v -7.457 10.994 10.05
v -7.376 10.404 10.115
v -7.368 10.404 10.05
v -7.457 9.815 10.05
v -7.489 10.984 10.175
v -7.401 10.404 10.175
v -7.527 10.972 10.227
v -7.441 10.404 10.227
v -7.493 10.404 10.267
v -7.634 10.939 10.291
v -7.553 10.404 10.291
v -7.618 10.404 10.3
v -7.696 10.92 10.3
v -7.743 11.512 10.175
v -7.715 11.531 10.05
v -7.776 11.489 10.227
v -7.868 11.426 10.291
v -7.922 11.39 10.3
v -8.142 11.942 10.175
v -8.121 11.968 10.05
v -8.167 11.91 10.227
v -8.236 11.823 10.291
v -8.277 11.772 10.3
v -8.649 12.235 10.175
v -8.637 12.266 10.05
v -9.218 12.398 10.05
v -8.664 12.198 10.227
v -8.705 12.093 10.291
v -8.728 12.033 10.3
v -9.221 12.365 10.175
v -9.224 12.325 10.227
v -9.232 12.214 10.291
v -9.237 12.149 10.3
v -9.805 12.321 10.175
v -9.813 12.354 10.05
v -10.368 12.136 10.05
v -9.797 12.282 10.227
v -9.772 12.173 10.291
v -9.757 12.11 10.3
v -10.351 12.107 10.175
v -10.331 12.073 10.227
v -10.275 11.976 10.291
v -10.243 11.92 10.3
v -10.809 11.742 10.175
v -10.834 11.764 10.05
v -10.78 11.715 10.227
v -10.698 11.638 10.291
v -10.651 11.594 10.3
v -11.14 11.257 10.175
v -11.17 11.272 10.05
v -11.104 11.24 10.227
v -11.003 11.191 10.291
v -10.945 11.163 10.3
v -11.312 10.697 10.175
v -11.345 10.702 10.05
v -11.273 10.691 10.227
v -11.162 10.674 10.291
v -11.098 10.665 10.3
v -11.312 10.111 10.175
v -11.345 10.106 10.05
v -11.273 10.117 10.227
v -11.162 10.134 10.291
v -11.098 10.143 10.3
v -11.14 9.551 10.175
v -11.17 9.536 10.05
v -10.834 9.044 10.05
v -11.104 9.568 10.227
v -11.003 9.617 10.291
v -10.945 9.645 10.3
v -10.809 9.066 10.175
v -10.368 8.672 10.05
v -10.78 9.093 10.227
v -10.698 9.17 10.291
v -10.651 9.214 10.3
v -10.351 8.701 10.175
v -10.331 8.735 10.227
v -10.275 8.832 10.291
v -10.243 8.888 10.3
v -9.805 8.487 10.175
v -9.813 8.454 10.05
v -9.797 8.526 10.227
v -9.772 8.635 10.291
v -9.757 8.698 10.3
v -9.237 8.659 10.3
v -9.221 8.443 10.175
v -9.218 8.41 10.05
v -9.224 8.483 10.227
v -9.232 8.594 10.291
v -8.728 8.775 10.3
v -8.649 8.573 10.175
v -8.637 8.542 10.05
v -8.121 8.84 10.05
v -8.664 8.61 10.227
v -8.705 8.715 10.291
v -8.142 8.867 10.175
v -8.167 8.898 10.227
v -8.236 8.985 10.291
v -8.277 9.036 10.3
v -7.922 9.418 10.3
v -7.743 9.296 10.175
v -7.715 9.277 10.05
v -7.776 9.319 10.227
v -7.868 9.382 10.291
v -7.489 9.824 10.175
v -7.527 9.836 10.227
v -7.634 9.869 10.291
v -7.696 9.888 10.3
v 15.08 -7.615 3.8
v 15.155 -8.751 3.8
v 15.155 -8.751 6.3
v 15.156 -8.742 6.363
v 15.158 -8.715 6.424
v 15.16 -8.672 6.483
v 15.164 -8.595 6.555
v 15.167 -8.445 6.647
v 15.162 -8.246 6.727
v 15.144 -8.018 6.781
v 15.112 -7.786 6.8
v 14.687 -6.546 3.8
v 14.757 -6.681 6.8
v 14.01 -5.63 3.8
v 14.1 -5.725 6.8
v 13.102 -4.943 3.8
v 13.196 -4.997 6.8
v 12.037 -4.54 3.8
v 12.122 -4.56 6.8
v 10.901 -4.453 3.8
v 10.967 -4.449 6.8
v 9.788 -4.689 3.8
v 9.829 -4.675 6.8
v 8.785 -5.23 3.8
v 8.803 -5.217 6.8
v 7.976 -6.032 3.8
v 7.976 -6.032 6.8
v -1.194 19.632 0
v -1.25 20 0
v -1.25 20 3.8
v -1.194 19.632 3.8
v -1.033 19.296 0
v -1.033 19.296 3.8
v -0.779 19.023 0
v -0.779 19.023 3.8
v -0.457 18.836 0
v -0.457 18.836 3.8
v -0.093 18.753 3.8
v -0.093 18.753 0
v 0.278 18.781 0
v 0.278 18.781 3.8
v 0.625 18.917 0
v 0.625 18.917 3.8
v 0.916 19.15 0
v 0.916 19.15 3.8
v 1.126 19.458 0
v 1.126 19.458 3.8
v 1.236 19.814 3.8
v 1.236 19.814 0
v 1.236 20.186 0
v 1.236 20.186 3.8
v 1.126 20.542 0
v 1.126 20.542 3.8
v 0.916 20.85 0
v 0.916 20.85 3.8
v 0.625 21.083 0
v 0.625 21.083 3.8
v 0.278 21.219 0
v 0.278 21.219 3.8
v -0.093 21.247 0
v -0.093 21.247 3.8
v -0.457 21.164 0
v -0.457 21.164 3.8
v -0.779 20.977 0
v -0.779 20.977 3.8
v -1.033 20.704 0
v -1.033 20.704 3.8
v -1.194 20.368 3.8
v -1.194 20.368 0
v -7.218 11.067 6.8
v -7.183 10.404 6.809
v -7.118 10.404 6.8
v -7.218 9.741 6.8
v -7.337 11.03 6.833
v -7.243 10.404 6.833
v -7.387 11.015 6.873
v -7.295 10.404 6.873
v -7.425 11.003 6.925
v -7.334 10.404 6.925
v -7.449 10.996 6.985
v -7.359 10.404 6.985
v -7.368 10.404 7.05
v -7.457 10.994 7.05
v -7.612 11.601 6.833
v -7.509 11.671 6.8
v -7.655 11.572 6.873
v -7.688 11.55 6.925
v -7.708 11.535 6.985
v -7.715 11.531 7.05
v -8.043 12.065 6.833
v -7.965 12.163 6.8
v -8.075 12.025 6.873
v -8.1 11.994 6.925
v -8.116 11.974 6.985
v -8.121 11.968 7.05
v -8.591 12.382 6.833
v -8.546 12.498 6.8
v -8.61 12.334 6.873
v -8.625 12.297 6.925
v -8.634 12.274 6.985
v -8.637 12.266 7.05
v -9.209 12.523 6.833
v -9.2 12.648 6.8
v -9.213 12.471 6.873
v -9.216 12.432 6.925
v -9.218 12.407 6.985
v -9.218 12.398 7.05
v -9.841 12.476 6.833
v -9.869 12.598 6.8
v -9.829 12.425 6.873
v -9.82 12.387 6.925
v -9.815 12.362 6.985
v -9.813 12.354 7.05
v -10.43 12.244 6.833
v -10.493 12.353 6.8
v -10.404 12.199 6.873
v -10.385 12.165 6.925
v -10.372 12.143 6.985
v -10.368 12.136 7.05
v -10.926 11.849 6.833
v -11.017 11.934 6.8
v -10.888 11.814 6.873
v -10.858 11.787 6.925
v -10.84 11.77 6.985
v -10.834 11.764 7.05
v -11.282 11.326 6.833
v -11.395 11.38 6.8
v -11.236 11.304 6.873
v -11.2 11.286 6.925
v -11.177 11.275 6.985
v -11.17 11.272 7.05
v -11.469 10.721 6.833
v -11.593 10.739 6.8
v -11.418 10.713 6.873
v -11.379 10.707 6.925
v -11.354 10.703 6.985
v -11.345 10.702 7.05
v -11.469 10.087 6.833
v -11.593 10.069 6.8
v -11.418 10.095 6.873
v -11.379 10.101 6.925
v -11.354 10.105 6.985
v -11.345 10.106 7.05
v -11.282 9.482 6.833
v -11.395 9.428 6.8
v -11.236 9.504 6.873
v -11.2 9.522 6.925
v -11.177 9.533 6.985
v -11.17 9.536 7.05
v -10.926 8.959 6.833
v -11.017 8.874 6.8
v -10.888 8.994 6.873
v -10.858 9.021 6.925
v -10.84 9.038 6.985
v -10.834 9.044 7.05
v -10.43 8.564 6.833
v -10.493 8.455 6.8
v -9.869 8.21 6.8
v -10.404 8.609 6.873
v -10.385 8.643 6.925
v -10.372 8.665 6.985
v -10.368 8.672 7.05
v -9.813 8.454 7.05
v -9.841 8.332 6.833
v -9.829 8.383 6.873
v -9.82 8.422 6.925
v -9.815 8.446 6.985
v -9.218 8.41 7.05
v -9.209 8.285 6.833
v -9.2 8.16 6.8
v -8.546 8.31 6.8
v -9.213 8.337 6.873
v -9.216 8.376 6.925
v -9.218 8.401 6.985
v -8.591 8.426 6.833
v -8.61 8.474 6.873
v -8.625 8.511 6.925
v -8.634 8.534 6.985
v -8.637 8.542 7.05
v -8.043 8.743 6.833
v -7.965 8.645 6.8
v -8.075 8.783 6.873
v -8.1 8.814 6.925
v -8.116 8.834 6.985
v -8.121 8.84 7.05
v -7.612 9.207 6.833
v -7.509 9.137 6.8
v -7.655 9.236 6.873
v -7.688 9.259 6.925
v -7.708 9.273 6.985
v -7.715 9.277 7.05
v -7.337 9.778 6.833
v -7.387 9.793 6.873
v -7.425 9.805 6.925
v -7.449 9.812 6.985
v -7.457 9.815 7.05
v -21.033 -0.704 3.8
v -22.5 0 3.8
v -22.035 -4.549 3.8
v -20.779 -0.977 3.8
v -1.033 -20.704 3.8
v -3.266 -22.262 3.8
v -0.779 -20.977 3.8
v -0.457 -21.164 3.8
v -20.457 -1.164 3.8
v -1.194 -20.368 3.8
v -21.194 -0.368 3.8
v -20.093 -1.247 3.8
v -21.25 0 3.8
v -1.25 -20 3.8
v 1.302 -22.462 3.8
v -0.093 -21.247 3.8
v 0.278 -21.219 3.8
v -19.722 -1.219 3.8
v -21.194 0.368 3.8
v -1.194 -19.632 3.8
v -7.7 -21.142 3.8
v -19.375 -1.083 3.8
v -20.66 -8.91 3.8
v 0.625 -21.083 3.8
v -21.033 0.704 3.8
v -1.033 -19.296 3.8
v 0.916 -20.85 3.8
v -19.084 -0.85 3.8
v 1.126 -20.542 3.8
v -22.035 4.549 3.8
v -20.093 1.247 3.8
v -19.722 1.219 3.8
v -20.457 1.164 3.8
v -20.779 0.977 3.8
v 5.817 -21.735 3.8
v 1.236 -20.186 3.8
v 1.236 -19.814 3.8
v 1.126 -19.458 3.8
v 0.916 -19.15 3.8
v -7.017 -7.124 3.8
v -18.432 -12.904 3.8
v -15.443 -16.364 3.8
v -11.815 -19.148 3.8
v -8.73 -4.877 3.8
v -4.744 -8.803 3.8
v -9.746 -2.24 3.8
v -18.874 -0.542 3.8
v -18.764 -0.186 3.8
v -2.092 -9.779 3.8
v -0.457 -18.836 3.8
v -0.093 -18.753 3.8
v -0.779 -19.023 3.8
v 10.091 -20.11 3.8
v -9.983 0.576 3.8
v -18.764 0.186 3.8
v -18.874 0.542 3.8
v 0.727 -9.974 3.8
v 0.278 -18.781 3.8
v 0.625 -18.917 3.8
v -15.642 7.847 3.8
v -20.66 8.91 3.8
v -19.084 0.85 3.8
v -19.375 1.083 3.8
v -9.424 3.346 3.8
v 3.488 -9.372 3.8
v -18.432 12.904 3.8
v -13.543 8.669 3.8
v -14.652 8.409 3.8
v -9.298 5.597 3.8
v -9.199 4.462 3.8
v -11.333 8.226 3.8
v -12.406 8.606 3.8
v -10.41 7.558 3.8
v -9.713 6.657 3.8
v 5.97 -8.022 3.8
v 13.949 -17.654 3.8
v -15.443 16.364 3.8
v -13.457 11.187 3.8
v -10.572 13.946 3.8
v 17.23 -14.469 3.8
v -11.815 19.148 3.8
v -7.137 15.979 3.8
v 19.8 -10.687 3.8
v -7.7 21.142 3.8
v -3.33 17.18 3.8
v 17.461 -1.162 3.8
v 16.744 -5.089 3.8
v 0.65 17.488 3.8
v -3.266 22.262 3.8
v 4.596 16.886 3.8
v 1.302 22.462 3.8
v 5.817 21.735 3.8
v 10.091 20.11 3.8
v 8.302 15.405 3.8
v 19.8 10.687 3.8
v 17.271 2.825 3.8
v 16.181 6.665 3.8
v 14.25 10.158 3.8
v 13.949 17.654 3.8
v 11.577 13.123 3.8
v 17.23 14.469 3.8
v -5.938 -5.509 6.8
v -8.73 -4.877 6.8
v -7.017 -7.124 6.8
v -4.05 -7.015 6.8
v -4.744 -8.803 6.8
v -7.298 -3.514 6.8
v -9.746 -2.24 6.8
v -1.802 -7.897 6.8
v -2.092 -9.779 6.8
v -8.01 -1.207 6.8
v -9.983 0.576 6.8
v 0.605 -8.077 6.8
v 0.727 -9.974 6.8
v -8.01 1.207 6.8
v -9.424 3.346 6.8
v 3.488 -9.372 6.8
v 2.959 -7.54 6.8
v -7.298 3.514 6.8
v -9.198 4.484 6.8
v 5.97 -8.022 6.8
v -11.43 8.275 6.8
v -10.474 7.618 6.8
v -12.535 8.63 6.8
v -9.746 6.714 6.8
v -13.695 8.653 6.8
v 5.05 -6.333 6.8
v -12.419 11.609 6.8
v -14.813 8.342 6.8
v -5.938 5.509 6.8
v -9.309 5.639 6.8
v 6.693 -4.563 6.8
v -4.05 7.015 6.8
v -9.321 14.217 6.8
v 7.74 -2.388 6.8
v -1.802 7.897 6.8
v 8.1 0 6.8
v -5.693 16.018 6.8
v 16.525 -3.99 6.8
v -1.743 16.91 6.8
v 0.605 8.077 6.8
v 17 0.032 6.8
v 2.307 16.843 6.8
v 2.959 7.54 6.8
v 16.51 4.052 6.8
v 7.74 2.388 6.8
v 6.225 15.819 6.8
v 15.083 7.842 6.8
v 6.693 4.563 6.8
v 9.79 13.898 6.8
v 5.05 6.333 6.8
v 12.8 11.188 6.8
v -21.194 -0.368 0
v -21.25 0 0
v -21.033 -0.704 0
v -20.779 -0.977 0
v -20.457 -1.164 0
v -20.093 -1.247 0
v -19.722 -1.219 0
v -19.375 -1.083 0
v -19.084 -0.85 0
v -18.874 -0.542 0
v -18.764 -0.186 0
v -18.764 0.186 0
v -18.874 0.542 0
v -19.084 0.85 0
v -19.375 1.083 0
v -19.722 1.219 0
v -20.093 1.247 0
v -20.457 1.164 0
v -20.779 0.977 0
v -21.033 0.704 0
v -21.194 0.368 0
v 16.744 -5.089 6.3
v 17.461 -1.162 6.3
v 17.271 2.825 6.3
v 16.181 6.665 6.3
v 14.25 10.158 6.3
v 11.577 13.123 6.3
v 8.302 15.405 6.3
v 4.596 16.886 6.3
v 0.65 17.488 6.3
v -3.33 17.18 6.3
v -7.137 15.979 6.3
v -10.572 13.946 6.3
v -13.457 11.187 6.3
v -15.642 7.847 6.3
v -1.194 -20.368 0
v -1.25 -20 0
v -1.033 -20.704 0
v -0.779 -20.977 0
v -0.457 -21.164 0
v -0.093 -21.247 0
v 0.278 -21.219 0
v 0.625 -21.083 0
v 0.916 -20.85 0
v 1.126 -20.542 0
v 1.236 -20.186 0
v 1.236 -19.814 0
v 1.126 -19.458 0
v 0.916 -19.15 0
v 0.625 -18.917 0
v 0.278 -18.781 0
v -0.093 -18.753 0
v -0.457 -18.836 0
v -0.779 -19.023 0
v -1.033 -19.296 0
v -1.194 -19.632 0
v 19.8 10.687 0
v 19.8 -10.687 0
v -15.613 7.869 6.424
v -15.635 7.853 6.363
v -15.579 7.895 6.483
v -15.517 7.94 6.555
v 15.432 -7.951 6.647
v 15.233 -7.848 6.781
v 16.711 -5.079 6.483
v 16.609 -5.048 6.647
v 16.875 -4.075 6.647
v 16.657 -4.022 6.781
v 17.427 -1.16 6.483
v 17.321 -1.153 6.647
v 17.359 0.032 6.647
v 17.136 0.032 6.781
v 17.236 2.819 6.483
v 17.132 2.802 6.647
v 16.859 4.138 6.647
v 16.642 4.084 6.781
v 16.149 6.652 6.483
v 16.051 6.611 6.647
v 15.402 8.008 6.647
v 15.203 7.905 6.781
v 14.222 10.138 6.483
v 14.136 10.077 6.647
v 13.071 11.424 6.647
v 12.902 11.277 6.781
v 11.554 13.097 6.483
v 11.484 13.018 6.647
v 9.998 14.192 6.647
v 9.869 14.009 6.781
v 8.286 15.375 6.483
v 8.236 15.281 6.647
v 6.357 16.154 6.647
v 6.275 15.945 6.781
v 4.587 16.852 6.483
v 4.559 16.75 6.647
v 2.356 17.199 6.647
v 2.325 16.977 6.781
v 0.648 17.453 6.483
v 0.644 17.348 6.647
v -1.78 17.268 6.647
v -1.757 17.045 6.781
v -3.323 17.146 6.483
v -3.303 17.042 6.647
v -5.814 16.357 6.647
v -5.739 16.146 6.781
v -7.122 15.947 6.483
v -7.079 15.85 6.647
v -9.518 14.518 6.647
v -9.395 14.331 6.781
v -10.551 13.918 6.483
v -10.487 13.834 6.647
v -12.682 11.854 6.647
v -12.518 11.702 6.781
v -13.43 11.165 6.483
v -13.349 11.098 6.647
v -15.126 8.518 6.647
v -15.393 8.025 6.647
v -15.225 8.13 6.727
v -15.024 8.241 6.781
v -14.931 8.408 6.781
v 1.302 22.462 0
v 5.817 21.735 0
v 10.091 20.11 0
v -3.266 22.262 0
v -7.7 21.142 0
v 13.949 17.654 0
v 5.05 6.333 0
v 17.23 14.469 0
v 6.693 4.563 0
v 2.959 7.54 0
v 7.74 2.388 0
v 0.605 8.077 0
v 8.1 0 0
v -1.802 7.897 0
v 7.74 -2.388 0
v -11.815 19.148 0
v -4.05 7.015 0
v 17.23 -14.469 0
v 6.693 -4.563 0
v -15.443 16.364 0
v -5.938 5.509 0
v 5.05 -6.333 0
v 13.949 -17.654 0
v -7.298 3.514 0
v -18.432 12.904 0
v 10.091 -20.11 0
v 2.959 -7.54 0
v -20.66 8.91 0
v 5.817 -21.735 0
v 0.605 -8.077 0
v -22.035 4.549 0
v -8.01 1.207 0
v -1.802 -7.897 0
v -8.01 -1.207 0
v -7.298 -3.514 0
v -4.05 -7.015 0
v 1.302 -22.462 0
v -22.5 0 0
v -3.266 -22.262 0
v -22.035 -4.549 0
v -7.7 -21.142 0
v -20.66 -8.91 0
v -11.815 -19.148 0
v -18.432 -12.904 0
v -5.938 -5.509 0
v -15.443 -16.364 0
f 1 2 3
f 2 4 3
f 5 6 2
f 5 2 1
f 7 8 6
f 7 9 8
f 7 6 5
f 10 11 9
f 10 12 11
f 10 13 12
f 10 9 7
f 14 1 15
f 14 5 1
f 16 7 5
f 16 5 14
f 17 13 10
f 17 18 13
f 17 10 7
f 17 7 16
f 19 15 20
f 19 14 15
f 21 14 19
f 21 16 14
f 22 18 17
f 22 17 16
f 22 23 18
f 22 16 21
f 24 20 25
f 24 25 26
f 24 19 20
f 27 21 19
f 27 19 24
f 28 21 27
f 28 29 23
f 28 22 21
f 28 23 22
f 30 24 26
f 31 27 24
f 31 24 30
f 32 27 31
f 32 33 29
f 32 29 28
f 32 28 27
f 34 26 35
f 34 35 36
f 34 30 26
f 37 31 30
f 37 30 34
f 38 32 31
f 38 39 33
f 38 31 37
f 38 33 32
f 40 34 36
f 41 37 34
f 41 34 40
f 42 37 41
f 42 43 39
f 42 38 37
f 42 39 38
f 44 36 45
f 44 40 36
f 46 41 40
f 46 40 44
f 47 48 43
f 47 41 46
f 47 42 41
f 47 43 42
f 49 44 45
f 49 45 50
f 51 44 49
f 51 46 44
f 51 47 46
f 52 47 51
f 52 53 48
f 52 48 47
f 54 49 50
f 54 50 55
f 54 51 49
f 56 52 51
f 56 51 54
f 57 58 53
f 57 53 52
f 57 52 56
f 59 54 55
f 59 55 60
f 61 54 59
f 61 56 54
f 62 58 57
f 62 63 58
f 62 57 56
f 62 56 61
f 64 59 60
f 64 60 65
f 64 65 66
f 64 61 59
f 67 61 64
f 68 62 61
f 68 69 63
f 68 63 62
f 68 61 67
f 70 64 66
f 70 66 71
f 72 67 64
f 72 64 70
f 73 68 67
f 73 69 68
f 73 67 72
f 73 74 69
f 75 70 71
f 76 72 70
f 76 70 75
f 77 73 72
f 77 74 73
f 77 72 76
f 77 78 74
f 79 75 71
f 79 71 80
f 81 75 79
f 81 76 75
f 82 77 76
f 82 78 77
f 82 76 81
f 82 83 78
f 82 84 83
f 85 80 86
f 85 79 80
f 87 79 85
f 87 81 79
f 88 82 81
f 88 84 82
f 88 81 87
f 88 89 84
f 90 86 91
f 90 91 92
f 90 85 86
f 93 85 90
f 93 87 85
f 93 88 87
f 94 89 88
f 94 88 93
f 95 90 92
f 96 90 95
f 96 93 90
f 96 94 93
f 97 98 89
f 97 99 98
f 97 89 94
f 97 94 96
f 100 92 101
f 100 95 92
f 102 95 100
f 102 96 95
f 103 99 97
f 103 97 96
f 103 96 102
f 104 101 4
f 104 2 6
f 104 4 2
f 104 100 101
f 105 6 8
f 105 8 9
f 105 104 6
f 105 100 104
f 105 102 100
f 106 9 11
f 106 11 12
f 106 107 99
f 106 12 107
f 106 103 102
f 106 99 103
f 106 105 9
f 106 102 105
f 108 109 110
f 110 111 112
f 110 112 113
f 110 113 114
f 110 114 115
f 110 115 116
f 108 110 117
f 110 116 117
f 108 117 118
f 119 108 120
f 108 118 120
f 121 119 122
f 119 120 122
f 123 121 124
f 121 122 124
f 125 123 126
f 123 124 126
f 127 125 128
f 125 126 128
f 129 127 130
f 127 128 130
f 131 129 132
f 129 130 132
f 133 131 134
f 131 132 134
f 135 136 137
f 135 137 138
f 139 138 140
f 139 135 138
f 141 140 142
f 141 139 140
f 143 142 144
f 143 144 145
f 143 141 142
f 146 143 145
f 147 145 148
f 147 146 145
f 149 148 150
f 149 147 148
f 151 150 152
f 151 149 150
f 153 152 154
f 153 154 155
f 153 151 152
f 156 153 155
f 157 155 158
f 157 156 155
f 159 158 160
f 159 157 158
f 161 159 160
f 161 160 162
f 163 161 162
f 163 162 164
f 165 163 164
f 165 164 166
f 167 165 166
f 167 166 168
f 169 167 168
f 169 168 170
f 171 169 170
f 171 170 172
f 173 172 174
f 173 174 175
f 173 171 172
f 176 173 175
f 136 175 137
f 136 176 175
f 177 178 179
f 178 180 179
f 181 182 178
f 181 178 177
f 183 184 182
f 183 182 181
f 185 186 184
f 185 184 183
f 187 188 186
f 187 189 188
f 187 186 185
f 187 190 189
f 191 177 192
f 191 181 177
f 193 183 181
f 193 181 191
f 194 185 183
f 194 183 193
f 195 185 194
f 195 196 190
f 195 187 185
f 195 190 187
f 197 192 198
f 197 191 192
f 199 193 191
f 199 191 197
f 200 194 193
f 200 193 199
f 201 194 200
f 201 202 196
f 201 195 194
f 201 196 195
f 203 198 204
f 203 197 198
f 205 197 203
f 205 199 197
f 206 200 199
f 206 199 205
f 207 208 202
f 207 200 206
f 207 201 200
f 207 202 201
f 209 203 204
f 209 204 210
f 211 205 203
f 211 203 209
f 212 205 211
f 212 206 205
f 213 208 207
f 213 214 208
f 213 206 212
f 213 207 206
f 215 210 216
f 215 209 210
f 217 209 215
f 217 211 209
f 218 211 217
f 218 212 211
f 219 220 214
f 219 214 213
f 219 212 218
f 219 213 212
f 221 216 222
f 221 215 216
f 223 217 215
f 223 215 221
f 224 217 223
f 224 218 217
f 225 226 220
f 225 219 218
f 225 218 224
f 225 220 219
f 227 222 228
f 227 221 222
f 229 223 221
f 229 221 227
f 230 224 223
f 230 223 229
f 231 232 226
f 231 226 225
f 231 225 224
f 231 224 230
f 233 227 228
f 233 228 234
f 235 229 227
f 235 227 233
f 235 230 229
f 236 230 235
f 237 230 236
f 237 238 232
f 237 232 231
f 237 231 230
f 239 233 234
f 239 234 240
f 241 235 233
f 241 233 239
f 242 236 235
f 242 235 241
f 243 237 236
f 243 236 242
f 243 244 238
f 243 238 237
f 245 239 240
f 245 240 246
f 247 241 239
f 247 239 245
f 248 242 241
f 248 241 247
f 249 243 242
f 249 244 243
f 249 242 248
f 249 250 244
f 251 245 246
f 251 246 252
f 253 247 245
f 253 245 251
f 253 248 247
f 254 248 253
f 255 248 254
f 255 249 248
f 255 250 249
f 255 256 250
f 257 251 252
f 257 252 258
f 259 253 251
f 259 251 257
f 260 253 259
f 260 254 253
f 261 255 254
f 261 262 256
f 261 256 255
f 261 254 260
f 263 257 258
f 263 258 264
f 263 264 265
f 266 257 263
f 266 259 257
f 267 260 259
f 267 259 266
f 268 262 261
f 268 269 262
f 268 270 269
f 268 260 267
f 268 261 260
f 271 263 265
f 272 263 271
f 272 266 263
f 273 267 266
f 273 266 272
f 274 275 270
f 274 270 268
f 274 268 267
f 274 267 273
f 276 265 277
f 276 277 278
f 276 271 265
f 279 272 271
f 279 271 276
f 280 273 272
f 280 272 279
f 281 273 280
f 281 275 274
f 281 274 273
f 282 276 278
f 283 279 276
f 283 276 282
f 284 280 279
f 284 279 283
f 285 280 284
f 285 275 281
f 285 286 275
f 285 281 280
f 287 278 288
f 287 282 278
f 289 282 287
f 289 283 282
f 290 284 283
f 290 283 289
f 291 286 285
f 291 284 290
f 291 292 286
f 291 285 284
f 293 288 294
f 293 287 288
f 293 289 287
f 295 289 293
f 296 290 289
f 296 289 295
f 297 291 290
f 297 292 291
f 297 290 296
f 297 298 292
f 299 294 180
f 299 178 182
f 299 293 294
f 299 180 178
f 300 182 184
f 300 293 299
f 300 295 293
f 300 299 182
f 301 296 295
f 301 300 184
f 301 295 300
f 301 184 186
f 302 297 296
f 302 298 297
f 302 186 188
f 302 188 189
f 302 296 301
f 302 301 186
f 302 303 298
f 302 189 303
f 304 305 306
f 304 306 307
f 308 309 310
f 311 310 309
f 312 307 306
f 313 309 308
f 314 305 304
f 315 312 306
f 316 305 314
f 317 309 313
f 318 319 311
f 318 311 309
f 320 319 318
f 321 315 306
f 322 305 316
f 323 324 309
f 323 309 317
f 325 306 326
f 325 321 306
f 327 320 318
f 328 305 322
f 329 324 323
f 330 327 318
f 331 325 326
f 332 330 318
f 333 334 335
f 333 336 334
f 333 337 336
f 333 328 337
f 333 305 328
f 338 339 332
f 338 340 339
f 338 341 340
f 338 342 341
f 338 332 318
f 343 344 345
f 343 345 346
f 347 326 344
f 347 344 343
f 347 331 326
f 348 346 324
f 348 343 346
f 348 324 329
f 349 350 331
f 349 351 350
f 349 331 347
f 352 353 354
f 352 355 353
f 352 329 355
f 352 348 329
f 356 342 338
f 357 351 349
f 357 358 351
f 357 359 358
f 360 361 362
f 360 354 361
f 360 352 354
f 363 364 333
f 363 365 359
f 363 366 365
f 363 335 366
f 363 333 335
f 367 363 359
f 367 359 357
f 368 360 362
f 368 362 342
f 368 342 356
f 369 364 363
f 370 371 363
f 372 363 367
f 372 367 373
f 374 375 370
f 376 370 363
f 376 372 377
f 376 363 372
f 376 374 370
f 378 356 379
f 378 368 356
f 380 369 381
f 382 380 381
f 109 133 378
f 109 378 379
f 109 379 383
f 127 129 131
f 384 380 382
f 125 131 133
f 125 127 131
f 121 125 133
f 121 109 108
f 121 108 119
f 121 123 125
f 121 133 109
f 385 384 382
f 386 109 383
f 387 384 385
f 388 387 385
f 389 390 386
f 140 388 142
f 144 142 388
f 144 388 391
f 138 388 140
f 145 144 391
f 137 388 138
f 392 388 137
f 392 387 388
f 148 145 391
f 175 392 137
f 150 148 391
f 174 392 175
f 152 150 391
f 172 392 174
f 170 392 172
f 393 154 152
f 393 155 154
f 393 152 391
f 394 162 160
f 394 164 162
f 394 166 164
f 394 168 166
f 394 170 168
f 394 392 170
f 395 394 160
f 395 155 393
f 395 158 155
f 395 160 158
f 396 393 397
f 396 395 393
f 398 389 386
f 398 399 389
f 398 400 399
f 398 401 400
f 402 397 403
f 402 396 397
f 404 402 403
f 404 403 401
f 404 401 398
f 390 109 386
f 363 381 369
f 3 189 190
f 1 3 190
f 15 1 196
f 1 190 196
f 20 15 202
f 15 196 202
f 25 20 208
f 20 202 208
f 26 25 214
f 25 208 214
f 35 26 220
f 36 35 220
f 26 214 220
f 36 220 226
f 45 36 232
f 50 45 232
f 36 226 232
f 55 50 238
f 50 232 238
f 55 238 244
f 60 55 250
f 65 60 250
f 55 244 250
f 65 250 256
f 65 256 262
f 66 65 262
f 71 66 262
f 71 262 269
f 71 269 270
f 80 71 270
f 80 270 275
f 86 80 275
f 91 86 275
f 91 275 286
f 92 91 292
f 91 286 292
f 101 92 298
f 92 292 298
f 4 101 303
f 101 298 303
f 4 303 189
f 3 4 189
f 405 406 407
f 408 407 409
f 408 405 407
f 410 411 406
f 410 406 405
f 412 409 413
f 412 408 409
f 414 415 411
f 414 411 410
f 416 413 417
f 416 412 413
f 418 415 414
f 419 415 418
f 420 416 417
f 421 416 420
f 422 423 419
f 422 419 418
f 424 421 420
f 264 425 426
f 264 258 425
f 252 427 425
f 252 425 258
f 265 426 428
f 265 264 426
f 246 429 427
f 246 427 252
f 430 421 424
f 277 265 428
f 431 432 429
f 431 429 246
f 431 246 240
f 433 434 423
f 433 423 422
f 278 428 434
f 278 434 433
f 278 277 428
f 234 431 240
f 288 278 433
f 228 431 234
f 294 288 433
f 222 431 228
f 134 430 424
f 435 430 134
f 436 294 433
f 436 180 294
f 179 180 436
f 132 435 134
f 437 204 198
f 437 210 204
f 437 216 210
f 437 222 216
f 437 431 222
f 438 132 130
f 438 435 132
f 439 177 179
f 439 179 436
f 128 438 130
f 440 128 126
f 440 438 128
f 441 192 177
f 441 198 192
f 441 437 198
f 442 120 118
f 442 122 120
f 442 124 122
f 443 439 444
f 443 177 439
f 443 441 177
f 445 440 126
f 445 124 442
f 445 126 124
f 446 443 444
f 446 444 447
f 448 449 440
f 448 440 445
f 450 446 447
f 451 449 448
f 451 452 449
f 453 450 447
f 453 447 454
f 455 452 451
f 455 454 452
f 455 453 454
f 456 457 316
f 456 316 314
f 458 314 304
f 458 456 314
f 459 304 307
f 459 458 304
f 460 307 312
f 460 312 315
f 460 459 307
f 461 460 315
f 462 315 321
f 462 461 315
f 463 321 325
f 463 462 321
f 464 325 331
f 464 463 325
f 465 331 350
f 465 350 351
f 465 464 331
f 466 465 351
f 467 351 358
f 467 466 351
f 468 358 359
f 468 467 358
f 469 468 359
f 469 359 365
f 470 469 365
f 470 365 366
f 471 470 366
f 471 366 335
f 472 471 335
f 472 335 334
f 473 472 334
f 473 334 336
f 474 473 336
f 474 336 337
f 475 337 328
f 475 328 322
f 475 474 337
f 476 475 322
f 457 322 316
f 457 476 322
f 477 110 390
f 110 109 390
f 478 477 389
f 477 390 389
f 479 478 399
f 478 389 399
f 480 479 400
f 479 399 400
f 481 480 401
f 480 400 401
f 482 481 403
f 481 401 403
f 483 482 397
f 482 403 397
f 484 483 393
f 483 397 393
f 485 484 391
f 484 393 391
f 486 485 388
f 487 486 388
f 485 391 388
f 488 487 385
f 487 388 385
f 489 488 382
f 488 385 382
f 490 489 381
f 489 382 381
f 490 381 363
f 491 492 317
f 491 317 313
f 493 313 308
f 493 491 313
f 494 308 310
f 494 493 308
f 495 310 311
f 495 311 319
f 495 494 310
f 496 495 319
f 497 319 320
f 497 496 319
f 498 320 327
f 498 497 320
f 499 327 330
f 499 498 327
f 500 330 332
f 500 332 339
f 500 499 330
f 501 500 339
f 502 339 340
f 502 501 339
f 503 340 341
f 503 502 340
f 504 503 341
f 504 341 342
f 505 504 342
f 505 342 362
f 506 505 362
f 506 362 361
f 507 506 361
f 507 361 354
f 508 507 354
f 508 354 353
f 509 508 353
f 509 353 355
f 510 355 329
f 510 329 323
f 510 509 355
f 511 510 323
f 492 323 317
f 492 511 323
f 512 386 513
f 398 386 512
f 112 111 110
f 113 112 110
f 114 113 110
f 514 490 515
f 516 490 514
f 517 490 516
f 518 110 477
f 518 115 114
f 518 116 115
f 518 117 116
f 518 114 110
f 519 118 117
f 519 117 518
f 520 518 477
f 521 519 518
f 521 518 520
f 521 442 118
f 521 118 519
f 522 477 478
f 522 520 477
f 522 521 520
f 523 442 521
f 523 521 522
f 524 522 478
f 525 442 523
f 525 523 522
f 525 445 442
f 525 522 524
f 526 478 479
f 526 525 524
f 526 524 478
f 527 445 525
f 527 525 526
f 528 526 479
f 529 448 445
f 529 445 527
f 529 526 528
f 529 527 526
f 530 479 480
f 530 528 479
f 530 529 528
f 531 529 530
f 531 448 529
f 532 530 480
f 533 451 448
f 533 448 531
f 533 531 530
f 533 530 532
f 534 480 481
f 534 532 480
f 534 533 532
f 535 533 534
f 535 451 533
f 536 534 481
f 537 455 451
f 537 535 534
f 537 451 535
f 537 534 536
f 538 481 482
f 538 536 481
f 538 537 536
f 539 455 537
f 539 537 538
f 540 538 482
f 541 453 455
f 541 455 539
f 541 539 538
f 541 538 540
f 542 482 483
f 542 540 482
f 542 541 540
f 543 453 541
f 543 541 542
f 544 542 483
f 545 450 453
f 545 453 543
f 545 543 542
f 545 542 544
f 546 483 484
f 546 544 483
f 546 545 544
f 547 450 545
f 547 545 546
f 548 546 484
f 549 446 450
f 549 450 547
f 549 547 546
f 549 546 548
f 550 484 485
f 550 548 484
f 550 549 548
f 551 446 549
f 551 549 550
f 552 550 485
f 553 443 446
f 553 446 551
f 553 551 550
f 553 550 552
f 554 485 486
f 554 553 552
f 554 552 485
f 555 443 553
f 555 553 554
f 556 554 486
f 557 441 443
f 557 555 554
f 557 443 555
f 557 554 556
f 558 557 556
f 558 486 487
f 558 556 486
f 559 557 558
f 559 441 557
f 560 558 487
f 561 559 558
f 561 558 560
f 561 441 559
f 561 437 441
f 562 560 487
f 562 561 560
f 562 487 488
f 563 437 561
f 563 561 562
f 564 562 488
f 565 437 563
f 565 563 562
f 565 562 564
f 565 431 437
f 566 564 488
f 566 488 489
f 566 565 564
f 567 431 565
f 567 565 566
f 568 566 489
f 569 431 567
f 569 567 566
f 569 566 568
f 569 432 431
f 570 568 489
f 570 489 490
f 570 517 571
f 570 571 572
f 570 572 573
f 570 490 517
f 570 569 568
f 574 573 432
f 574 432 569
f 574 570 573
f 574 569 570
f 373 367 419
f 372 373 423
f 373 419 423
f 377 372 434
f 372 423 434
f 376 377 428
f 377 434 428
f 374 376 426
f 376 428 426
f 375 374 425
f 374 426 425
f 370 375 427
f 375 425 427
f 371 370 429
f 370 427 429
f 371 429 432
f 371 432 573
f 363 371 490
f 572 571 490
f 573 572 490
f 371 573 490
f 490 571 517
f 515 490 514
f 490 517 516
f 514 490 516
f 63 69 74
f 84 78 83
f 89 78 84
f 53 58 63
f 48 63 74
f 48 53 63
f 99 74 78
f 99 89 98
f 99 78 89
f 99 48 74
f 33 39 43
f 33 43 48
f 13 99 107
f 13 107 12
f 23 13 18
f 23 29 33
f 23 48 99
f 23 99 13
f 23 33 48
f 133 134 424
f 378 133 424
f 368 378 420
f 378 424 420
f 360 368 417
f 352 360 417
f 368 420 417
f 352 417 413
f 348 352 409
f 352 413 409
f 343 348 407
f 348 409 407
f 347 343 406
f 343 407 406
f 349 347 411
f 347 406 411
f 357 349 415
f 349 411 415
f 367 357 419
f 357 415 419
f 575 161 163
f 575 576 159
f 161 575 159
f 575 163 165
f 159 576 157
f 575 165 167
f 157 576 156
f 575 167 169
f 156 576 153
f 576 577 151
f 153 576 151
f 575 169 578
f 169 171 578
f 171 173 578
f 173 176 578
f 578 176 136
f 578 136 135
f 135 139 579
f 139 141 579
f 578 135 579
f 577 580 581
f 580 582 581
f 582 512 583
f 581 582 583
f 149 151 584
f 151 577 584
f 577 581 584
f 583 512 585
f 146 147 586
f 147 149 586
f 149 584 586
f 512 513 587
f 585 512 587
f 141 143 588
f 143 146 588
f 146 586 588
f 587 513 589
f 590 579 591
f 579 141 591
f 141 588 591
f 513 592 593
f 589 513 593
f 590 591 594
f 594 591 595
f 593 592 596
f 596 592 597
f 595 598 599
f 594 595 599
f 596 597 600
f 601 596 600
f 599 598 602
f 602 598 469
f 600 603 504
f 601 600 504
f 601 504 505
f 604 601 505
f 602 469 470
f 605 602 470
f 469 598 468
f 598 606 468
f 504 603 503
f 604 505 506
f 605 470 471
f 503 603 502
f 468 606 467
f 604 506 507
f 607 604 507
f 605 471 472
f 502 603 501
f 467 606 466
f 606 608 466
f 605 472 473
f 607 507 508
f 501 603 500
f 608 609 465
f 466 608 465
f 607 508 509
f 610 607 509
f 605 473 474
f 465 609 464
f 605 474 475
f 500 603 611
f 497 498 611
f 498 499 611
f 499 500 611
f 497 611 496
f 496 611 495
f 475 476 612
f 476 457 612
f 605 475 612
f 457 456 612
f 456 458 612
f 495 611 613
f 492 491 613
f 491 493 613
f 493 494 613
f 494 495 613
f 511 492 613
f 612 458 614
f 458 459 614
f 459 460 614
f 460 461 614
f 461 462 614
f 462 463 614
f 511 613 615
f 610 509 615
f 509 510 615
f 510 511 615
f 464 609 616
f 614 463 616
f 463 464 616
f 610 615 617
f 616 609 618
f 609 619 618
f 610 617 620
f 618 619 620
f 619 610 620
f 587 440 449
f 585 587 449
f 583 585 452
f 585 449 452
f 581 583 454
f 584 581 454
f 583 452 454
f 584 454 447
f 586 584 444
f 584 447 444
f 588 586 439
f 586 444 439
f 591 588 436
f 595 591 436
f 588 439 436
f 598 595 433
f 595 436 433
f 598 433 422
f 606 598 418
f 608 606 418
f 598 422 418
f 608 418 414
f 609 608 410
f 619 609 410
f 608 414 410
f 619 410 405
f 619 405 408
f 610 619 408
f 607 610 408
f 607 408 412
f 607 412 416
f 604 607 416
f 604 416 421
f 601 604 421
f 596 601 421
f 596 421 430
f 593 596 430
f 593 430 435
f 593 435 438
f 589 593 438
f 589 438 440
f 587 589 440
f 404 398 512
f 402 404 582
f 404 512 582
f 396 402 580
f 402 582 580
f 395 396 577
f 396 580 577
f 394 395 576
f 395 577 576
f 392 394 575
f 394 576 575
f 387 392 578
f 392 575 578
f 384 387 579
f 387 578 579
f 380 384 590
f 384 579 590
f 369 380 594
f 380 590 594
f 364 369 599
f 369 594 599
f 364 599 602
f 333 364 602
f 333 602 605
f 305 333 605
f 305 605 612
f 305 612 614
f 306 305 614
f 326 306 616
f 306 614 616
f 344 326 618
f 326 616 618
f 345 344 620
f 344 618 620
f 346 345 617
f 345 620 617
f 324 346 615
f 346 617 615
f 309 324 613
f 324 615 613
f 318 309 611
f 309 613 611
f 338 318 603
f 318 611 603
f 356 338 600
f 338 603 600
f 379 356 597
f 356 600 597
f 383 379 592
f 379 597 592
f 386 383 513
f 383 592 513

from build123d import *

# Parameters (mm, degrees)
SKETCH_1_R          = 22.5
SKETCH_1_R_2        = 1.25
EXTRUDE_1_DEPTH     = 3.8
SKETCH_2_R          = 17.5
EXTRUDE_2_DEPTH     = 3
SKETCH_3_R          = 2
EXTRUDE_3_DEPTH     = 3.5
FILLET_1_R          = 0.5
FILLET_2_R          = 0.25
CUT_EXTRUDE_1_DEPTH = 3
SKETCH_5_R          = 8.1
CUT_EXTRUDE_2_DEPTH = 11
SKETCH_6_W          = 10.283159463
SKETCH_6_H          = 33.988548121
CUT_EXTRUDE_3_DEPTH = 17


with BuildPart() as part:
    # 草图1 → 凸台-拉伸1 (new body)
    with BuildSketch(Plane.XY):
        with Locations(Location((0, 0, 0), (0, 0, 180))):
            Circle(SKETCH_1_R)
        with Locations(Location((0, 20, 0), (0, 0, 180))):
            Circle(SKETCH_1_R_2, mode=Mode.SUBTRACT)
        with Locations(Location((0, -20, 0), (0, 0, 180))):
            Circle(SKETCH_1_R_2, mode=Mode.SUBTRACT)
        with Locations(Location((-20, 0, 0), (0, 0, 180))):
            Circle(SKETCH_1_R_2, mode=Mode.SUBTRACT)
    extrude(amount=EXTRUDE_1_DEPTH)

    # 草图2 → 凸台-拉伸2 (add)
    with BuildSketch(Plane.XY.offset(3.8)):
        Circle(SKETCH_2_R)
    extrude(amount=EXTRUDE_2_DEPTH)

    # 草图3 → 凸台-拉伸3 (add)
    with BuildSketch(Plane.XY.offset(6.8)):
        with Locations((-9.367828489, 10.404027557)):
            Circle(SKETCH_3_R)
    extrude(amount=EXTRUDE_3_DEPTH)

    # 圆角1
    fillet_1_edges = [part.edges().sort_by_distance(p)[0] for p in [
        (-17.5, 0, 6.8),
    ]]
    fillet(fillet_1_edges, radius=FILLET_1_R)

    # 圆角2
    fillet_2_edges = [part.edges().sort_by_distance(p)[0] for p in [
        (-11.367828489, 10.404027557, 6.8),
        (-11.367828489, 10.404027557, 10.3),
    ]]
    fillet(fillet_2_edges, radius=FILLET_2_R)

    # 草图4 → 切除-拉伸1 (cut)
    with BuildSketch(Plane.XY.offset(6.8)):
        with BuildLine():
            ThreePointArc((-16.962482908, 6.022804462), (-8.539705078, -15.845297005), (14.357267915, -10.856742514))
            ThreePointArc((14.357267915, -10.856742514), (13.579373382, -5.253629085), (7.976259953, -6.031523619))
            ThreePointArc((7.976259953, -6.031523619), (-4.744280599, -8.802942781), (-9.423601616, 3.346002479))
            ThreePointArc((-9.423601616, 3.346002479), (-11.85464127, 8.453844117), (-16.962482908, 6.022804462))
        make_face()
    extrude(amount=-CUT_EXTRUDE_1_DEPTH, mode=Mode.SUBTRACT)

    # 草图5 → 切除-拉伸2 (cut)
    with BuildSketch(Plane.XY.offset(6.8)):
        Circle(SKETCH_5_R)
    extrude(amount=-CUT_EXTRUDE_2_DEPTH, mode=Mode.SUBTRACT)

    # 草图6 → 切除-拉伸3 (cut)
    with BuildSketch(Plane.XY.offset(3.8)):
        with Locations((24.941579731, -0.947133109)):
            Rectangle(SKETCH_6_W, SKETCH_6_H)
    extrude(amount=-CUT_EXTRUDE_3_DEPTH, mode=Mode.SUBTRACT)


solid = part.part
